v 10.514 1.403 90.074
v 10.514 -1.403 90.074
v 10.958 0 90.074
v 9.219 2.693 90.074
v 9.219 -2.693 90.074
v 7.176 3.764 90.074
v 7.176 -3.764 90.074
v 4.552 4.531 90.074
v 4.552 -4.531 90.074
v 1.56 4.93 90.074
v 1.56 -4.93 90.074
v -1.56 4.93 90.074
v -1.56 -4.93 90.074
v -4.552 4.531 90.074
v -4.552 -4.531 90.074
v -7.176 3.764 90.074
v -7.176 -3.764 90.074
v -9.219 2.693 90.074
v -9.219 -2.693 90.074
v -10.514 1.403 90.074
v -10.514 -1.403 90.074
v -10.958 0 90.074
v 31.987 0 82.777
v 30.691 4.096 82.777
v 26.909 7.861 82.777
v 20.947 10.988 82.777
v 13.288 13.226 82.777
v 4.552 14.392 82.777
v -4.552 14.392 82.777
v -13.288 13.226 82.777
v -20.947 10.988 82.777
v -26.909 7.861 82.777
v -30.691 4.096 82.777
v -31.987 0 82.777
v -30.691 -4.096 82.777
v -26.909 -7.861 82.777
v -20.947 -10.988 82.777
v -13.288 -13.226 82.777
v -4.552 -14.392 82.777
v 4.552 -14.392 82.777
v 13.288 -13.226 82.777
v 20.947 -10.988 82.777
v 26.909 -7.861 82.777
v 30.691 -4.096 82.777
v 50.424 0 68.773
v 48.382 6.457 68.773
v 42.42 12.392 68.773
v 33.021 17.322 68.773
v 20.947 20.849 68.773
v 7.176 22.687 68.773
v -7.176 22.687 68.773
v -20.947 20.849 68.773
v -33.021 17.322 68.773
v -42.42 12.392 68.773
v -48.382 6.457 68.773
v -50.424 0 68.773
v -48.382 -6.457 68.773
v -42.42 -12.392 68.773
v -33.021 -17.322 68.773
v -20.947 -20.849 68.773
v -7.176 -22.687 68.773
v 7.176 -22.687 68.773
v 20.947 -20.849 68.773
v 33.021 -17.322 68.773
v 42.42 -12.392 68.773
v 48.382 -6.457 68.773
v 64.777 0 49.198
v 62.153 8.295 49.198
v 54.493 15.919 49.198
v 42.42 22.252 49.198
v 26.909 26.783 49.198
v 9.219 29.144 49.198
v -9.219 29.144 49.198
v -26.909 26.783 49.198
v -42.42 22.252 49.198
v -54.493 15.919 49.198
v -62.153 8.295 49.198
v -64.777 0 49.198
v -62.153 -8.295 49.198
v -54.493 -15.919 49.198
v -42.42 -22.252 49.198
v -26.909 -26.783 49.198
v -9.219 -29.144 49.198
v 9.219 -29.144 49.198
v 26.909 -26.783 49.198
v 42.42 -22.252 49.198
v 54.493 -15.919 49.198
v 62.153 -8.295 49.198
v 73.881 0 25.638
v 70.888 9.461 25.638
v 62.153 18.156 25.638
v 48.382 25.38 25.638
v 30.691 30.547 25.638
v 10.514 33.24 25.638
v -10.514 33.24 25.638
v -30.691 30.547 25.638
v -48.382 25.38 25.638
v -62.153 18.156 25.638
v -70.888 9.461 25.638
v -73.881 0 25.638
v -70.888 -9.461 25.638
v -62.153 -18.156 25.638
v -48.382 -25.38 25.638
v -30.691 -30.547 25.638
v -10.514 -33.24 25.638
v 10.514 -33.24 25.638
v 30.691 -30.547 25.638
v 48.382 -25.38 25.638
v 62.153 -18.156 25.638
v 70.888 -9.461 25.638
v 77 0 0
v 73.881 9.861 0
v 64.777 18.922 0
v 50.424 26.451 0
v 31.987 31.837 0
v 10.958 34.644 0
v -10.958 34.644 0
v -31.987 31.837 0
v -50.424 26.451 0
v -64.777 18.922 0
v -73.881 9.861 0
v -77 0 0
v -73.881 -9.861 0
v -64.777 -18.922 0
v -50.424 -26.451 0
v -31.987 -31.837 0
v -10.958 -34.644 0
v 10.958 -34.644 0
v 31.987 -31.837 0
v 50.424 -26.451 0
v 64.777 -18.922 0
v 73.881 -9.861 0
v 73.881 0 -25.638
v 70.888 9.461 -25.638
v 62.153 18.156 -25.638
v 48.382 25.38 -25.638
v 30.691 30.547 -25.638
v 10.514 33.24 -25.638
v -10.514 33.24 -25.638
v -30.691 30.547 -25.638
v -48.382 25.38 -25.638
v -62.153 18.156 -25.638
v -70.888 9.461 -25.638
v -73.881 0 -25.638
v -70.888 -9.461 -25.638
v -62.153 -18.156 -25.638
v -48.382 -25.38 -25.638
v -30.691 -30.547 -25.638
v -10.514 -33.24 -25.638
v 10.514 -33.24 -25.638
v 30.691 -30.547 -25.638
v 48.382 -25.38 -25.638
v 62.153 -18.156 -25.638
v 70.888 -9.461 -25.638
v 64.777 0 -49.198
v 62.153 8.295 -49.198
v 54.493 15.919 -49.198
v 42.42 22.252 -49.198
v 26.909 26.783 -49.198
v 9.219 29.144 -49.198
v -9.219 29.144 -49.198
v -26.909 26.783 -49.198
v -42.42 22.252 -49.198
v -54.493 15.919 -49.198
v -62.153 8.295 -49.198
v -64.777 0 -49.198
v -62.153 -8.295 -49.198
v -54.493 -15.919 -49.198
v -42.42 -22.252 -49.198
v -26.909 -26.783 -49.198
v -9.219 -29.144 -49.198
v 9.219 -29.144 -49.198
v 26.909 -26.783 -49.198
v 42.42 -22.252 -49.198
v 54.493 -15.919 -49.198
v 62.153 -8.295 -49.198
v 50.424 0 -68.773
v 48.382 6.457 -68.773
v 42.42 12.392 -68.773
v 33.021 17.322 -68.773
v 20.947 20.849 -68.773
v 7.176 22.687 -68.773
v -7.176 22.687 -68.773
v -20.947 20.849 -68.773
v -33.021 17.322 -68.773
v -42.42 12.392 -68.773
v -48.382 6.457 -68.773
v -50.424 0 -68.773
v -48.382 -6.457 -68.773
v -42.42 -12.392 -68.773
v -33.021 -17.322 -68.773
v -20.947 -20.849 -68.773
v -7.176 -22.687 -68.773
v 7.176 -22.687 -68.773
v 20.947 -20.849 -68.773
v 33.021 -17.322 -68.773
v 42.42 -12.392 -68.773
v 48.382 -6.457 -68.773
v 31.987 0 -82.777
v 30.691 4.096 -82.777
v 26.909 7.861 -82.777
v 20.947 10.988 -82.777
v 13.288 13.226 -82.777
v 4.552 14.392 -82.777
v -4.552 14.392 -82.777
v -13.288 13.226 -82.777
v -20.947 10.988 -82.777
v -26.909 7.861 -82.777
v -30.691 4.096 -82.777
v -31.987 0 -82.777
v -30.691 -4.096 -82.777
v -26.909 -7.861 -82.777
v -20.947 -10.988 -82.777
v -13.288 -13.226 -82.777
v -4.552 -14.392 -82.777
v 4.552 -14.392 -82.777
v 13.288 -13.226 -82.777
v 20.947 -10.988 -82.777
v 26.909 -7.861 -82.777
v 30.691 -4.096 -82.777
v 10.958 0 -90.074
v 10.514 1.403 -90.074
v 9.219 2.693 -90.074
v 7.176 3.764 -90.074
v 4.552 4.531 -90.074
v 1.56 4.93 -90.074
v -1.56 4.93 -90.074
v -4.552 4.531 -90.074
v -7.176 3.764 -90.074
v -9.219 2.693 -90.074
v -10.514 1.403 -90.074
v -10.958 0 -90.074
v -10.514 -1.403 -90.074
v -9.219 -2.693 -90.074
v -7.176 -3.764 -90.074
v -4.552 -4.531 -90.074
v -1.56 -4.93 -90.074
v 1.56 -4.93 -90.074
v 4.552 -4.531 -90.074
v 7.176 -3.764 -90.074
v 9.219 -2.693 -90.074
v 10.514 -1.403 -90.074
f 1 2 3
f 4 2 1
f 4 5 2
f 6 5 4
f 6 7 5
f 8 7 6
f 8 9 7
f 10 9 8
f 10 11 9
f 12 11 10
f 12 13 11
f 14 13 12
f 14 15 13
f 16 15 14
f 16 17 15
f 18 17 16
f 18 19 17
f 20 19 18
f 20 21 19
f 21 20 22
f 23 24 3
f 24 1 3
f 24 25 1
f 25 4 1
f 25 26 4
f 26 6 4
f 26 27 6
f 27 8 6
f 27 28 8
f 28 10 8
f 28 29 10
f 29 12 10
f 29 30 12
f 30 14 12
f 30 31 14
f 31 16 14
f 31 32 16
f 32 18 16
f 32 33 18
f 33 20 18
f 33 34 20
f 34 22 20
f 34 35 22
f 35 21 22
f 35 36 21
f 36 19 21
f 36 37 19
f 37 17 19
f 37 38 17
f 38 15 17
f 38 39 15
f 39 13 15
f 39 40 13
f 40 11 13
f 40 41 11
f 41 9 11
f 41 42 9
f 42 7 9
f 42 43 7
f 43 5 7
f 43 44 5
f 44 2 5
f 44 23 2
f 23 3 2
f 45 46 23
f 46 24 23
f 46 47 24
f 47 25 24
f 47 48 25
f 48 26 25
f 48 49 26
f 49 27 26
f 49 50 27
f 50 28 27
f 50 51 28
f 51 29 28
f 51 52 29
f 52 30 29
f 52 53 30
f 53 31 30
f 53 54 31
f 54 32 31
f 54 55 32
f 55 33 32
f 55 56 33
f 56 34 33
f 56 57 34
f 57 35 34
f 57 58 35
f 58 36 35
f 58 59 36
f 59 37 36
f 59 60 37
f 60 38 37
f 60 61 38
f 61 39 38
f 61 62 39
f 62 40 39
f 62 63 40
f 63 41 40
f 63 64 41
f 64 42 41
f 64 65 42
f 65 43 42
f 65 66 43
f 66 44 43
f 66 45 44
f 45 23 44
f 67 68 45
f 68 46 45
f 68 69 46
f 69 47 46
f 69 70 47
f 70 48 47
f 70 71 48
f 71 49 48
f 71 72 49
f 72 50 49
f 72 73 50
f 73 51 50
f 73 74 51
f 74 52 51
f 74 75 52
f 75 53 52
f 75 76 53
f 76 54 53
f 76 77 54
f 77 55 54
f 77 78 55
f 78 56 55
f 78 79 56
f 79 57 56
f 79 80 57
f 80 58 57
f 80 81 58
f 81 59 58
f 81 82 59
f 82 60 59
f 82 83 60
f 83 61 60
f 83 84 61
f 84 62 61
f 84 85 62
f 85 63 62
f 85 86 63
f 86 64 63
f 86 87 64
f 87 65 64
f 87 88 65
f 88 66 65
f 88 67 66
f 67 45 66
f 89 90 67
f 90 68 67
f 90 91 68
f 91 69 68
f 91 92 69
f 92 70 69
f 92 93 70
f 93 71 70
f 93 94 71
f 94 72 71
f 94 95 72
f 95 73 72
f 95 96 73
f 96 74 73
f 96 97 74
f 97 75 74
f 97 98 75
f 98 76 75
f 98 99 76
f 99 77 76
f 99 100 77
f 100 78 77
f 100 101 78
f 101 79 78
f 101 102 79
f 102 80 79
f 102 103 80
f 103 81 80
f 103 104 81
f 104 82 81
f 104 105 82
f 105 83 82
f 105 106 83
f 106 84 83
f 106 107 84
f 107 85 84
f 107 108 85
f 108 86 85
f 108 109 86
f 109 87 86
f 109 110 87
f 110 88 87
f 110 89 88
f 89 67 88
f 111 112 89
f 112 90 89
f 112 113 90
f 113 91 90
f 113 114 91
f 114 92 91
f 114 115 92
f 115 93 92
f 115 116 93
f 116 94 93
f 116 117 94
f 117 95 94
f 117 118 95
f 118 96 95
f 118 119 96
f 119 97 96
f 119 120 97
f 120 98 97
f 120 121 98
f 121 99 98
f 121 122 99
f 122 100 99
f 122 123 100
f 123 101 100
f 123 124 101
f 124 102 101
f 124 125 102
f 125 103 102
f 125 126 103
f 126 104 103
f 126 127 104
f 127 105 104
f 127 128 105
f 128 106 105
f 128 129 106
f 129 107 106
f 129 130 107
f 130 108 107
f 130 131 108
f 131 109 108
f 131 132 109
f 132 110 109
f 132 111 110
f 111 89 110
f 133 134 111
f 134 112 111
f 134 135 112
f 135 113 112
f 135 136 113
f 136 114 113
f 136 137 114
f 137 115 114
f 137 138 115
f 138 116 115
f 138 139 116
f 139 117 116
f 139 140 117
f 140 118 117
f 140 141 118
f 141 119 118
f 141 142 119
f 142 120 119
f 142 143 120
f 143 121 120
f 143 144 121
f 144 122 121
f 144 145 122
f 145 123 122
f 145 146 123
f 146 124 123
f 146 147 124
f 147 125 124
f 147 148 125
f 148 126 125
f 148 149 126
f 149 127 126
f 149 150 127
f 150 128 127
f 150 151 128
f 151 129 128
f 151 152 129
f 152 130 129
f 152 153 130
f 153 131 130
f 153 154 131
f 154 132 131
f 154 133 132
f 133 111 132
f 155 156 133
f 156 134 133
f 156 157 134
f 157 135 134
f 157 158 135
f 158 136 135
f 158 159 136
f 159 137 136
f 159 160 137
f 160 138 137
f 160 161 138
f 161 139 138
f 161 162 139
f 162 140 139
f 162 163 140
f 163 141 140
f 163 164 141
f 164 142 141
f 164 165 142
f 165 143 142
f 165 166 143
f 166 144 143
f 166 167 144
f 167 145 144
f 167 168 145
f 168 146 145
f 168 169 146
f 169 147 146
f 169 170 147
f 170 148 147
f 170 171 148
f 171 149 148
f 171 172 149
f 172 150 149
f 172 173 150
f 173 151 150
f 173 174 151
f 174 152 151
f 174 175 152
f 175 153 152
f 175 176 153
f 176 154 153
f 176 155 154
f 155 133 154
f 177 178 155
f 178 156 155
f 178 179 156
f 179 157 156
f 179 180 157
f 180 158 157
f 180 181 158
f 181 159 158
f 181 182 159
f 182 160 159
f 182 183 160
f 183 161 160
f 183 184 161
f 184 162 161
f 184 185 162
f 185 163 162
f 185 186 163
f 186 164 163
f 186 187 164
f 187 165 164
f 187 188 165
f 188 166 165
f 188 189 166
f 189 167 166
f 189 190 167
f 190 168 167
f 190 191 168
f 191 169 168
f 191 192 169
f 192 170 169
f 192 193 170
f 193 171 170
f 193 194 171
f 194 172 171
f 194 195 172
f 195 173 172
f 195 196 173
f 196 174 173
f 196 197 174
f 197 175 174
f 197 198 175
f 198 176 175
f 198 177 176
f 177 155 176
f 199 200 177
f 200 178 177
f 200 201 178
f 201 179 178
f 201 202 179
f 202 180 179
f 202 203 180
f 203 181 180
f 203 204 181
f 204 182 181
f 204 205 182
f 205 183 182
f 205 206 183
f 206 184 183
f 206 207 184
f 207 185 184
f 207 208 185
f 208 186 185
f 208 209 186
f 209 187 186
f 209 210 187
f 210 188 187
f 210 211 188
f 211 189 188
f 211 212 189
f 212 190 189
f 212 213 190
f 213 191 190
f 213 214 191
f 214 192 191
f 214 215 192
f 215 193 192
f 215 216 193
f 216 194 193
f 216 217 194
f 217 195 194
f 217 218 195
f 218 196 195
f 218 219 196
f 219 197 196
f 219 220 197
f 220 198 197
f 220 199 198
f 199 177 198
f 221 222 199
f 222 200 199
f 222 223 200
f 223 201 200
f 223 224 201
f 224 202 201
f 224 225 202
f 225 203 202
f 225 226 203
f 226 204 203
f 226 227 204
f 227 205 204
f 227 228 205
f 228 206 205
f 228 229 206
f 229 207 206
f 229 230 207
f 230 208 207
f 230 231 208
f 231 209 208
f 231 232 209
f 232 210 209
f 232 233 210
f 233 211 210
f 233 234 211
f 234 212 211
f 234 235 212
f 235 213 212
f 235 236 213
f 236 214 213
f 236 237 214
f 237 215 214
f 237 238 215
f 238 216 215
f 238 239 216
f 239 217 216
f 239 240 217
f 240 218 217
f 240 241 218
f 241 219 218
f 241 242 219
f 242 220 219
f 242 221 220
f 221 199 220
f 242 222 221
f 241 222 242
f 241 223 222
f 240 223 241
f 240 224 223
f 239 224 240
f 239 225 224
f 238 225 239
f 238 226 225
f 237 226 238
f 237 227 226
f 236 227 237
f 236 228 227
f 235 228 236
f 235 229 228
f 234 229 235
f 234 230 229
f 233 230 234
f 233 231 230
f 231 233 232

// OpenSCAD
// Generated by SolidPython 1.0.1 on 2020-07-29 00:46:49


scale(v = [11, 5, 13]) {
	sphere(r = 7);
}
/***********************************************
*********      SolidPython code:      **********
************************************************
 
# import packages: SolidPython
from solid import *
from solid.utils import *
from itertools import chain, combinations, permutations


class Resize:

    def __init__(self, scad_file):
        self.scad_file = scad_file
        #self.scad_file = import_scad(scad_file)
        # cone/cylinder param:
        self.r1 = 0
        self.r2 = 0
        self.h = 0
        # rectangular prism param:
        self.w = 0
        self.l = 0
        # ellipse param:
        self.r = 0

    # import OpenScad code (file name corresponds to shape)


    # classify shape + parameters
    def assign(self, param1, param2, param3):
        if self.scad_file == 'cone.scad':
            self.r1 = param1
            self.r2 = param2
            self.h = param3
        elif self.scad_file == 'cylinder.scad':
            self.r1 = param1
            self.r2 = param2
            self.h = param3
        elif self.scad_file == 'rectangularPrism.scad':
            self.h = param1
            self.l = param2
            self.w = param3
        else:
            self.r = param1
            self.h = param2

    # resize parameters
    def iterate(self):
        x = range(3, 20, 2)
        i = 1
        if self.scad_file == 'cone.scad':
            tempList = list(permutations(x, 2))
            for temp in tempList:
                param1 = temp[0]
                param2 = temp[1]
                filepath = 'produced_scad_files/' + 'cone' + str(param1) + '_' + str(param2) + '_' + '.scad'
                scad_render_to_file(cylinder(h=param1, r1=param2, r2=0), filepath)

        elif self.scad_file == 'cylinder.scad':
            tempList = list(permutations(x, 3))
            for temp in tempList:
                param1 = temp[0]
                param2 = temp[1]
                filepath = 'produced_scad_files/' + 'cylinder' + str(param1) + '_' + str(param2) + '_' + '.scad'
                scad_render_to_file(cylinder(h=param1, r1=param2, r2=param2), filepath)

        elif self.scad_file == 'rectangularPrism.scad':
            tempList = list(permutations(x, 3))
            for temp in tempList:
                param1 = temp[0]
                param2 = temp[1]
                param3 = temp[2]
                filepath = 'produced_scad_files/' + 'rectangularPrism' + str(param1) + '_' + str(param2) + '_' + str(
                    param3) + '.scad'
                scad_render_to_file(cube(size=(param1, param2, param3)), filepath)

        elif self.scad_file == 'ellipse.scad':
            tempList = list(permutations(x, 4))
            for temp in tempList:
                param1 = temp[0]
                param2 = temp[1]
                param3 = temp[2]
                param4 = temp[3]
                filepath = 'produced_scad_files/' + 'ellipse' + str(param1) + '_' + str(param2) + '_' + str(param3) + '_' + str(param4) + '.scad'
                scad_render_to_file(scale([param1, param2, param3])(sphere(r=param4)), filepath)

    def render_to_scadfile(self):
        scad_render_to_file(scad, 'example.scad') 
 
************************************************/
